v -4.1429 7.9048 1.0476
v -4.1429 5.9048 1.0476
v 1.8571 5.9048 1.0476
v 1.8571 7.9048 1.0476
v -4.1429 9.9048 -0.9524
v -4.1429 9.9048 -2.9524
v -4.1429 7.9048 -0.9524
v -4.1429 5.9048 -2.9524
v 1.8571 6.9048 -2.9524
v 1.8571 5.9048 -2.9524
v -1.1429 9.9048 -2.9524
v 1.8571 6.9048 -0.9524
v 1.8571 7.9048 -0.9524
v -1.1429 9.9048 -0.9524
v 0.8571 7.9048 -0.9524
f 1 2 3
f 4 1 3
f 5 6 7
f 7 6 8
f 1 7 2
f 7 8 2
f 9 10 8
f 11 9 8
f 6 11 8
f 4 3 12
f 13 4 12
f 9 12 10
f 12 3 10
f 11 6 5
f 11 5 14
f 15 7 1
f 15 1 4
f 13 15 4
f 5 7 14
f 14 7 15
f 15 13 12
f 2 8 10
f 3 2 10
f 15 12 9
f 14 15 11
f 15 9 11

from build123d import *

# Parameters (mm, degrees)
SKETCH_1_W          = 30
SKETCH_1_H          = 20
EXTRUDE_1_DEPTH     = 10
SKETCH_1_3_W        = 30
SKETCH_1_3_H        = 10
EXTRUDE_2_DEPTH     = 20
CUT_EXTRUDE_1_DEPTH = 10
SCALE_1_SCALE       = 0.2


with BuildPart() as part:
    # 草圖1 → 填料-伸長1 (new body)
    with BuildSketch(Plane(origin=(0, 0, 0), x_dir=(1, 0, 0), z_dir=(0, 1, 0))):
        Rectangle(SKETCH_1_W, SKETCH_1_H)
    extrude(amount=EXTRUDE_1_DEPTH)

    # 草圖1<3> → 填料-伸長2 (add)
    with BuildSketch(Plane(origin=(0, 0, 0), x_dir=(1, 0, 0), z_dir=(0, 1, 0))):
        with Locations((0, 5)):
            Rectangle(SKETCH_1_3_W, SKETCH_1_3_H)
    extrude(amount=EXTRUDE_2_DEPTH)

    # 草圖2 → 除料-伸長1 (cut)
    with BuildSketch(Plane(origin=(0, 0, -10), x_dir=(-1, 0, 0), z_dir=(0, 0, -1))):
        Polygon((-15, 5), (0, 20), (-15, 20), align=None)
    extrude(amount=-CUT_EXTRUDE_1_DEPTH, mode=Mode.SUBTRACT)


with BuildPart() as part_1:
    # 縮放比例1: scaled about (-1.428571429, 7.380952381, -1.19047619)
    add(part.part.scale(SCALE_1_SCALE).moved(Location((-1.142857143, 5.904761905, -0.952380952))))


solid = part_1.part
